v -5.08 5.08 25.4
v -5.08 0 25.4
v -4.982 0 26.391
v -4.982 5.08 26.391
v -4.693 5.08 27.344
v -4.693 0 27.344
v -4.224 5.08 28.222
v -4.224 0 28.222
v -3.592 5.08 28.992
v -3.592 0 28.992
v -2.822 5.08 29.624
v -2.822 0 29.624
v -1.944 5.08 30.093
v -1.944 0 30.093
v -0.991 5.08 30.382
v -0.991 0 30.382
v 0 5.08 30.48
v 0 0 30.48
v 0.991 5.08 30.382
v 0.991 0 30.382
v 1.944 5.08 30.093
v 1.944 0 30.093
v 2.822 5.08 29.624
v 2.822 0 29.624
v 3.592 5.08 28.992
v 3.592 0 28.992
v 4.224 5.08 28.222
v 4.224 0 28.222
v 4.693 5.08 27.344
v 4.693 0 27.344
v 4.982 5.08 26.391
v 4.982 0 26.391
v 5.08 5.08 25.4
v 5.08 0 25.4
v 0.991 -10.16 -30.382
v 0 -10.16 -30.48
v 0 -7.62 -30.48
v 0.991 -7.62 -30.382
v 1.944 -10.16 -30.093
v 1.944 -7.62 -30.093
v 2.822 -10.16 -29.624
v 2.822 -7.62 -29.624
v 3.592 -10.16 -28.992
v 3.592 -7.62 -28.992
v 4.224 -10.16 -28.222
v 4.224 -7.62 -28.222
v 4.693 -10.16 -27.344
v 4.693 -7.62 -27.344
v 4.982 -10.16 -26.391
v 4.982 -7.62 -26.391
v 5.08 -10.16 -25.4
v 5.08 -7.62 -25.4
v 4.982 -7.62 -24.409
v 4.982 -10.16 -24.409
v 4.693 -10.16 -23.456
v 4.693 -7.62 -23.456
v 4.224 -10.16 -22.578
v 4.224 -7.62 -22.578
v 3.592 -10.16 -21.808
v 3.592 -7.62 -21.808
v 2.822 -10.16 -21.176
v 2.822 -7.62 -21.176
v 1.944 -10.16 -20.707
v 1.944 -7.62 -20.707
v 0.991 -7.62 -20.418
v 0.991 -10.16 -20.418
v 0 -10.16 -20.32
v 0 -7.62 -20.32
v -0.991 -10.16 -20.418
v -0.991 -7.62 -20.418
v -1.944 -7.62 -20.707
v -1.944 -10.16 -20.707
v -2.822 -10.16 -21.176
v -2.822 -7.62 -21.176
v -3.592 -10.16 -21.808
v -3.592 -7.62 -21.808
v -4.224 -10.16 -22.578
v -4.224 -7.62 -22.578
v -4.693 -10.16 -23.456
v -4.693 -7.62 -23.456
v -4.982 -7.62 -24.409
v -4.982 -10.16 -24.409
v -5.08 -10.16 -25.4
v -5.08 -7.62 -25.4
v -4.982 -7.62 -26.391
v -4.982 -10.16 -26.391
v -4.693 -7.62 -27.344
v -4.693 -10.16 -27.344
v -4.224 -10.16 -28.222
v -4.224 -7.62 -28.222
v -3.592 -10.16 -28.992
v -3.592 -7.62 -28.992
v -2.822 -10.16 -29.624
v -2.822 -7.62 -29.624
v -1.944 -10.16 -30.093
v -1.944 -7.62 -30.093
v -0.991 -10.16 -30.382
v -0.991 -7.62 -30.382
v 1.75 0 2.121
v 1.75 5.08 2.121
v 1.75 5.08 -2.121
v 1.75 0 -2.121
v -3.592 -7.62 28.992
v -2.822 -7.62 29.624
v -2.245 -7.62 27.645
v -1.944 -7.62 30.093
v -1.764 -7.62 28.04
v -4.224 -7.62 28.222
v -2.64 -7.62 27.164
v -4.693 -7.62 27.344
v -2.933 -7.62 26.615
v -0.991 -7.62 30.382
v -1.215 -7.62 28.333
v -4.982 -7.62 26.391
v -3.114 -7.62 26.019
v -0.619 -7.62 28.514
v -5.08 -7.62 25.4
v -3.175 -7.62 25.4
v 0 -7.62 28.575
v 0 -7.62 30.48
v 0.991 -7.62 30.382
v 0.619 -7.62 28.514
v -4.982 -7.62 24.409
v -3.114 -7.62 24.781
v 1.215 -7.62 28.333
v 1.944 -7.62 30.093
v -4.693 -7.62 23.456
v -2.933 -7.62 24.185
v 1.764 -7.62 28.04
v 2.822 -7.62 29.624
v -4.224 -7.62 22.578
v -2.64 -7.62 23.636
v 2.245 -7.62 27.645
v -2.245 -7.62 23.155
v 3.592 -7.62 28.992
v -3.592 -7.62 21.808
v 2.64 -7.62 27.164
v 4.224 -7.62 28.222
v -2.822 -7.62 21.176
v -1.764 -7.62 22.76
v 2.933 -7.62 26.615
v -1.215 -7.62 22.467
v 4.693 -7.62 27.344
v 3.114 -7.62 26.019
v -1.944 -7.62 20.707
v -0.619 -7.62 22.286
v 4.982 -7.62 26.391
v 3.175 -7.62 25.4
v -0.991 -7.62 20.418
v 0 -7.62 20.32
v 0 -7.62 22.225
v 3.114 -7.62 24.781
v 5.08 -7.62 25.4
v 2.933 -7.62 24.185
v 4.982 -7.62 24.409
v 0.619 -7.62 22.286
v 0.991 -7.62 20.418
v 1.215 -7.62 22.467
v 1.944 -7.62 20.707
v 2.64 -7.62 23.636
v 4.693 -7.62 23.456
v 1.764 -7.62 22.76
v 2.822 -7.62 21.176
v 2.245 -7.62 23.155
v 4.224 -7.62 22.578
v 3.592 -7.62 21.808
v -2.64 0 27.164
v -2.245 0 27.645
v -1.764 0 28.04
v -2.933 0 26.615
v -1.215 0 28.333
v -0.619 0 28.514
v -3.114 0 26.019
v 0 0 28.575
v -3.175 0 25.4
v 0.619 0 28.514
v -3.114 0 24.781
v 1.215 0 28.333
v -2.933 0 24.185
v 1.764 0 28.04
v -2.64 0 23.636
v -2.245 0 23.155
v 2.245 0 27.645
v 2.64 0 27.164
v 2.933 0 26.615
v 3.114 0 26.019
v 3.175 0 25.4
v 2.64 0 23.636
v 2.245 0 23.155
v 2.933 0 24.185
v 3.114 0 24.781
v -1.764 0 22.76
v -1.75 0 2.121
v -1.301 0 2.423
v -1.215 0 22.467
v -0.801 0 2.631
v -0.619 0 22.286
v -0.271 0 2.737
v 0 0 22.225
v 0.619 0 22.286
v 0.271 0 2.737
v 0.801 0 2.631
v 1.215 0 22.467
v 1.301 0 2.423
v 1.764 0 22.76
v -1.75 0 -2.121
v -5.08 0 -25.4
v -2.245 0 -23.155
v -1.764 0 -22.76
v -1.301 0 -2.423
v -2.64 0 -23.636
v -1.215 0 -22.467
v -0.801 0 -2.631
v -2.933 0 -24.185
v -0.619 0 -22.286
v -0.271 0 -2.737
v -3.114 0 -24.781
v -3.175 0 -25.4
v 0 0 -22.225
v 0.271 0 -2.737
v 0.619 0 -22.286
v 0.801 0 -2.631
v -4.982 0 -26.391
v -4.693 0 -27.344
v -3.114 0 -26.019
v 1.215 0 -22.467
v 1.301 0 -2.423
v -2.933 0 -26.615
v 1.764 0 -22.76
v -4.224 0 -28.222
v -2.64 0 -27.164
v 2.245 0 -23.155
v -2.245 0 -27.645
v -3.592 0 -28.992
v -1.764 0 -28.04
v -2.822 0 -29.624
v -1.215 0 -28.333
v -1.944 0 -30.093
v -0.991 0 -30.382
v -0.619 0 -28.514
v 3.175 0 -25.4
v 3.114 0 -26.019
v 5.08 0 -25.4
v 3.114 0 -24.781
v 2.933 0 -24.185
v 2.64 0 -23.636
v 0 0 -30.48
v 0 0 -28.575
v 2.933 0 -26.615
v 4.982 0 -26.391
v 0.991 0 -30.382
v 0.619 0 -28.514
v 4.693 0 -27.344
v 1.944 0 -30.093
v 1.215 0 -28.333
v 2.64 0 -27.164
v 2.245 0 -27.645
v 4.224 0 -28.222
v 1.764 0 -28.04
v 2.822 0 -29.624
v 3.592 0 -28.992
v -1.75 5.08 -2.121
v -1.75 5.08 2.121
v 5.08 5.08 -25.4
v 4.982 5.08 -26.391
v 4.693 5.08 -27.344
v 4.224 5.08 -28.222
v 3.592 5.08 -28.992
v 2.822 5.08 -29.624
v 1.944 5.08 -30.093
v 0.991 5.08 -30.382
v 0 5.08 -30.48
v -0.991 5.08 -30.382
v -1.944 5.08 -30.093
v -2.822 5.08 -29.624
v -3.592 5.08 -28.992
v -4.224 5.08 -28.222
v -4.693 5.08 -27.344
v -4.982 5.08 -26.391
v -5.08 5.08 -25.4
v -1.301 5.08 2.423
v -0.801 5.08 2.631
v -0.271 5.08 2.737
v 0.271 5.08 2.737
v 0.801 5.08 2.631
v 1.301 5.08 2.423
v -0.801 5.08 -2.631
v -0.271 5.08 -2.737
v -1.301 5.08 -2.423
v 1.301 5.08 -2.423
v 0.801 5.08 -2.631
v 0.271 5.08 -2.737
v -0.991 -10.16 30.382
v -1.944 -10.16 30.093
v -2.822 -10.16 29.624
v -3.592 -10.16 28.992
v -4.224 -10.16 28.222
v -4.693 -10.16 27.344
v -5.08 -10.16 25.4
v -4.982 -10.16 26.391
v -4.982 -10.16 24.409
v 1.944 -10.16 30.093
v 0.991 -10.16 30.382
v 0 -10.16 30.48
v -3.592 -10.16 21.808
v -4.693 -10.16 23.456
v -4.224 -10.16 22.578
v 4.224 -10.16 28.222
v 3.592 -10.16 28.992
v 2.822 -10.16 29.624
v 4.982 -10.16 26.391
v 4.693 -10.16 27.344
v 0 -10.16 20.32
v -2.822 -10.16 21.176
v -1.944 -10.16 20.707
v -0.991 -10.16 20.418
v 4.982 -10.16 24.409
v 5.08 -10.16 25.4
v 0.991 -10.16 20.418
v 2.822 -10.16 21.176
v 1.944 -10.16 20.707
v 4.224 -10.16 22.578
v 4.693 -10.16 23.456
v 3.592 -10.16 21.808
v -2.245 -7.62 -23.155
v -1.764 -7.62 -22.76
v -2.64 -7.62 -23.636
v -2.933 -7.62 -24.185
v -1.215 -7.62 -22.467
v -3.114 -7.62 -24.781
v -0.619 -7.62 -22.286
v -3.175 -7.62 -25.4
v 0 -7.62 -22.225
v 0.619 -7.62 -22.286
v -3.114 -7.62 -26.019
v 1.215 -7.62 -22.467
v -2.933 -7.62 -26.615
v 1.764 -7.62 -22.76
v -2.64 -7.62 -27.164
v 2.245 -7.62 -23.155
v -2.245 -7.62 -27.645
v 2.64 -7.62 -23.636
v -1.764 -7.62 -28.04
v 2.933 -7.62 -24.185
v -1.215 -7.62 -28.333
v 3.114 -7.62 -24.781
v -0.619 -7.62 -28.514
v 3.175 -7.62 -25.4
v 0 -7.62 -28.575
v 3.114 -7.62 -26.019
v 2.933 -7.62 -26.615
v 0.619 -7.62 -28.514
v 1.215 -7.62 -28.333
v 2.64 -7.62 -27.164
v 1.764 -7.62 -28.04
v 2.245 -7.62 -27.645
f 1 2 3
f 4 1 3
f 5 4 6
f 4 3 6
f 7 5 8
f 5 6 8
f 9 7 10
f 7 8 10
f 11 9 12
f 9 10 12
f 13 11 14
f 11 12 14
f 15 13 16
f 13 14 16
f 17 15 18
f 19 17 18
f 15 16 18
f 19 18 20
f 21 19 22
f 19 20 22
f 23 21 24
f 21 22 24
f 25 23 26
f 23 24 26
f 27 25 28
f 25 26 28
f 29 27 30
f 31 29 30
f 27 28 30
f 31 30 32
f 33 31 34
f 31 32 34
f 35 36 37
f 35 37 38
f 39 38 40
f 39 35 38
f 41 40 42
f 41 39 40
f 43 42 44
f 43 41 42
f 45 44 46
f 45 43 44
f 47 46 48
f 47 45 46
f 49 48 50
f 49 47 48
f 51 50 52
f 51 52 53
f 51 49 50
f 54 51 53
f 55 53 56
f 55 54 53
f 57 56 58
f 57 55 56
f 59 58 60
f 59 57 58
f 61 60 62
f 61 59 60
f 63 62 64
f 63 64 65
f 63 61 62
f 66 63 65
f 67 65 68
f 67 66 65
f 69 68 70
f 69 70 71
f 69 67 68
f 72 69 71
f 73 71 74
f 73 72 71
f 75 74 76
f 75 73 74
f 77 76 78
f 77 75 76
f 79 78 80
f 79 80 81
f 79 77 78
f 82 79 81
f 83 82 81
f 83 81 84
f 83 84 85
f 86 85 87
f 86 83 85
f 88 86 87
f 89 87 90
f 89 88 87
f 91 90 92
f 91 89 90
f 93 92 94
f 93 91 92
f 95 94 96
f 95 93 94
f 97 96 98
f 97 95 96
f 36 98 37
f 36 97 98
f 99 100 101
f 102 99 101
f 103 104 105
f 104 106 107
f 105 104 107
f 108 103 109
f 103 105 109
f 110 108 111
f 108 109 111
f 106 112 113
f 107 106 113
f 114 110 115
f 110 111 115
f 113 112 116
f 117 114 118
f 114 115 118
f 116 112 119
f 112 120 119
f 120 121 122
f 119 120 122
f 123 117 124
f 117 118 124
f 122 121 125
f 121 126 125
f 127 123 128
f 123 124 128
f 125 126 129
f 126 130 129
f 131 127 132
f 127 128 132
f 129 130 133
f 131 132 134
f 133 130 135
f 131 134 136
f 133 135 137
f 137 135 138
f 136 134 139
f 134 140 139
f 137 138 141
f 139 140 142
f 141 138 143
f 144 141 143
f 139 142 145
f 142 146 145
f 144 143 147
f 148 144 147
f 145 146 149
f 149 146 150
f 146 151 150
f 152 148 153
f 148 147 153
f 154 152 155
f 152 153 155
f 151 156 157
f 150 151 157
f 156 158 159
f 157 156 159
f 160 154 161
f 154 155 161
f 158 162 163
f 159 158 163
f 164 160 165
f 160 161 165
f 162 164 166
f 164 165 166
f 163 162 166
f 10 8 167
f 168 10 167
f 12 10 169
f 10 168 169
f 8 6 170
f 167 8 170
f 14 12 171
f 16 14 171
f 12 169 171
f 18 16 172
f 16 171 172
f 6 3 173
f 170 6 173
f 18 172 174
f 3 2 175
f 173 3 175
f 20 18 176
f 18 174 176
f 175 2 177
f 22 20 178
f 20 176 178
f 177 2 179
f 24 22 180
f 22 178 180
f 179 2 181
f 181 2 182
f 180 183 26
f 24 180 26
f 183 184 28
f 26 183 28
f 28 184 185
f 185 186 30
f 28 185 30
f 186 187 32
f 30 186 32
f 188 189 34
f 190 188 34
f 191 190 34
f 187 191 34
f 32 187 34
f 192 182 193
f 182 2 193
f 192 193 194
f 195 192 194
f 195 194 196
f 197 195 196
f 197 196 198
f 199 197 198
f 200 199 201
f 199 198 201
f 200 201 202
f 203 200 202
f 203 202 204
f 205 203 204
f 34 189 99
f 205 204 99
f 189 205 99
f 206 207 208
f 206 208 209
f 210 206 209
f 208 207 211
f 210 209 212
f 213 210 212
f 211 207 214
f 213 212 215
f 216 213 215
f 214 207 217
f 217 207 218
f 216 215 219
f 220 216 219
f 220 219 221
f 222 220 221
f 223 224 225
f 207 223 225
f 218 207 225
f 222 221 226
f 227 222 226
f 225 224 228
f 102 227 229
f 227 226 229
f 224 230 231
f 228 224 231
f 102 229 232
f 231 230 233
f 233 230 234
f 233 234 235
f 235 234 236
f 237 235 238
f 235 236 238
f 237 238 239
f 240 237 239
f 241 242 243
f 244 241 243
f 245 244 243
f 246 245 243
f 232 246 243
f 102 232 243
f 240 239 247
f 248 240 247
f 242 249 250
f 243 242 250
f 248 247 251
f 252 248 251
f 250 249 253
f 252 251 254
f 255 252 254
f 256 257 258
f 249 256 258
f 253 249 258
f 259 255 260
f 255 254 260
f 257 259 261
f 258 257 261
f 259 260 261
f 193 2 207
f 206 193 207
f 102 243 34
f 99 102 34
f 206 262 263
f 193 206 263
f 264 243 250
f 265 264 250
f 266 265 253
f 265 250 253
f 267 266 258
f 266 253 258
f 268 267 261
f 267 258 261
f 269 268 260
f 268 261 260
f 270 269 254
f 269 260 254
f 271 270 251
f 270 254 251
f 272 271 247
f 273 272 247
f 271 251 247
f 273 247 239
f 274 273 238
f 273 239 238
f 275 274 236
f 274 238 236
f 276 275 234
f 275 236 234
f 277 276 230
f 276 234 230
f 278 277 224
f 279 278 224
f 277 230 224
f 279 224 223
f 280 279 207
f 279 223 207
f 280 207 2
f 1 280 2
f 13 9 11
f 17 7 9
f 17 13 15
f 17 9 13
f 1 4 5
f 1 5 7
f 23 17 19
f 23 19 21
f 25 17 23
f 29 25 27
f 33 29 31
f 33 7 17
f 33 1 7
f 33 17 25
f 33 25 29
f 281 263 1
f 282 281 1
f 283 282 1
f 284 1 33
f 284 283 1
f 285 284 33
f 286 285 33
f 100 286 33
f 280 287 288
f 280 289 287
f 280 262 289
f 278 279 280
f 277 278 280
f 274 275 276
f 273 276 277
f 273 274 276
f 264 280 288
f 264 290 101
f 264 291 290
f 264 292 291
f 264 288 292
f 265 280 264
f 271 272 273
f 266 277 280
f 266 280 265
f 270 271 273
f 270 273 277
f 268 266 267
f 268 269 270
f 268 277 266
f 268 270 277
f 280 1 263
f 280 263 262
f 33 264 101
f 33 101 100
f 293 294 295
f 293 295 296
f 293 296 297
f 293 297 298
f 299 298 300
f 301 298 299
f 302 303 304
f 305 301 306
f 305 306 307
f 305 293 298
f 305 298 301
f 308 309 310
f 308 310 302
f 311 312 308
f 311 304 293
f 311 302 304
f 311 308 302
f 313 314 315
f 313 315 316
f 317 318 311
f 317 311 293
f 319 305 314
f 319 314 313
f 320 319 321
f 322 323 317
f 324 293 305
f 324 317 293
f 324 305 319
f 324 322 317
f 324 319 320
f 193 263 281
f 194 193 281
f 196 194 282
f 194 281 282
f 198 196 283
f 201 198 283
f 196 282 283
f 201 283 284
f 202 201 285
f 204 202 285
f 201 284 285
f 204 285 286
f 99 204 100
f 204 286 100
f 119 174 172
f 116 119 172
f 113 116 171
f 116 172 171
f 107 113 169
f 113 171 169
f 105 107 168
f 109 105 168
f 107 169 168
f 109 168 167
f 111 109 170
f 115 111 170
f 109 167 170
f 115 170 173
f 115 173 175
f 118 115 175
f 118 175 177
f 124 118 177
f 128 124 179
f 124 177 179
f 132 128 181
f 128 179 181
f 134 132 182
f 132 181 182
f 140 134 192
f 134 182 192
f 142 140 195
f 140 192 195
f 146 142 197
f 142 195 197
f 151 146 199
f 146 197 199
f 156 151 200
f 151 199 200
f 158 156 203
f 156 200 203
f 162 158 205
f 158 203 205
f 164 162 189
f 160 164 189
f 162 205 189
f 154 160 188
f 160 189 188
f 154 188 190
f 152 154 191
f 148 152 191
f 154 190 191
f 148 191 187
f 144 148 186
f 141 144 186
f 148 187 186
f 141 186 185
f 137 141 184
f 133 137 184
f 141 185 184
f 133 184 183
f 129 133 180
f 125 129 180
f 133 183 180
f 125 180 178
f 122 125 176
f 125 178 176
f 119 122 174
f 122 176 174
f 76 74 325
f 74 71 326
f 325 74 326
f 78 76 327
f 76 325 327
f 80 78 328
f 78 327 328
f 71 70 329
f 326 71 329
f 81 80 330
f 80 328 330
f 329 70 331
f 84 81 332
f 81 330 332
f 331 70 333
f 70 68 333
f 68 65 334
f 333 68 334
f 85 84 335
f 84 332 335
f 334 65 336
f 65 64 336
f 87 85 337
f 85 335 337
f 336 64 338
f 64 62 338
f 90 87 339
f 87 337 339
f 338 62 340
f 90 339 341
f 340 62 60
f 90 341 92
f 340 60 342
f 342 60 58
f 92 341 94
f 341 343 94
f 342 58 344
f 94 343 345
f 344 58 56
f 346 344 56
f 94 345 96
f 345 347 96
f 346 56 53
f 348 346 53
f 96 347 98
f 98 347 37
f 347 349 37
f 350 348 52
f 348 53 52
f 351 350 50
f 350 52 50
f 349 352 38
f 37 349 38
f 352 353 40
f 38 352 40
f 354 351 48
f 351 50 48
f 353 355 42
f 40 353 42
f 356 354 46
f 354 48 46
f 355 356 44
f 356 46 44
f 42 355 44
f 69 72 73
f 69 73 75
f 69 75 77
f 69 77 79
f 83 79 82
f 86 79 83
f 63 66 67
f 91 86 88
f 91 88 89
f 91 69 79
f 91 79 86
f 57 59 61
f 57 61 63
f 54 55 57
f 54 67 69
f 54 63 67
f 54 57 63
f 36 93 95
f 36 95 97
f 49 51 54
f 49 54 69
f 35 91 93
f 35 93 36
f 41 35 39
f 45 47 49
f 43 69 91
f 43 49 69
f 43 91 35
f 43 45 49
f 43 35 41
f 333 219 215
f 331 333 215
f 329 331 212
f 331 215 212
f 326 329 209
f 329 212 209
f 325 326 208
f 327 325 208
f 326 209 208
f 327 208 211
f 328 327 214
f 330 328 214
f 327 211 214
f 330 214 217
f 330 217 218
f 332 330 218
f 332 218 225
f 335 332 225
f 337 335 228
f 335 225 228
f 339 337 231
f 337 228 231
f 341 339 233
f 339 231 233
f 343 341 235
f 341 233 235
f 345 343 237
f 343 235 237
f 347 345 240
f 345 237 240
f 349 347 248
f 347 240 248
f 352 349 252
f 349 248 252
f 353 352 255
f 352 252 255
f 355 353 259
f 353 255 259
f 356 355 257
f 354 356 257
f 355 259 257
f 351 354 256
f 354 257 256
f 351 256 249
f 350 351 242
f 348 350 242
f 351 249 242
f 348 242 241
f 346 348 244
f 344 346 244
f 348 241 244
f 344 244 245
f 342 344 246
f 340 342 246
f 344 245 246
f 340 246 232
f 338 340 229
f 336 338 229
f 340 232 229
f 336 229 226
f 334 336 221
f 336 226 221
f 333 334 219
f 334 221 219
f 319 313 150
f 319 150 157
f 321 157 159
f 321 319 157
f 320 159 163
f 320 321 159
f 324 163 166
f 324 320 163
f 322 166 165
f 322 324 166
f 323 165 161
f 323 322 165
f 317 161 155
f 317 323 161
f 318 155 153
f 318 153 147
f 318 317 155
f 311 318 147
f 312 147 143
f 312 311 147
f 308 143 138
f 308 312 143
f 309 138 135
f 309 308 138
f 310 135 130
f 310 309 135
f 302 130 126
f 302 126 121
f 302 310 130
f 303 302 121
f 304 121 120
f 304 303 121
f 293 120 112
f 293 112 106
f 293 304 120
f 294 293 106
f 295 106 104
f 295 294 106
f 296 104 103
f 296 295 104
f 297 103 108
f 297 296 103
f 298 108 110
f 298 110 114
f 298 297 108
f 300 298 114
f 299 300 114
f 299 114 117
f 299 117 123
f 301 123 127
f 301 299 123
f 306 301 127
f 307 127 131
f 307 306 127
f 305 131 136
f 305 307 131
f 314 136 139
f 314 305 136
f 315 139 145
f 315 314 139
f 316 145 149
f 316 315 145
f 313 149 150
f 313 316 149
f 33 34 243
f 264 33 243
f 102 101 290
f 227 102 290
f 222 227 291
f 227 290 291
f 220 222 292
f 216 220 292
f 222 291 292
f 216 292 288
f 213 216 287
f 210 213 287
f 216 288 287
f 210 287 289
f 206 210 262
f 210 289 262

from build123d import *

# Parameters (mm, degrees)
BOSS_EXTRUDE1_DEPTH = 5.08
SKETCH3_R           = 3.175
BOSS_EXTRUDE2_DEPTH = 7.62
BOSS_EXTRUDE3_START = 2.54
SKETCH6_R           = 5.08
BOSS_EXTRUDE3_DEPTH = 2.54
BOSS_EXTRUDE4_START = 2.54
SKETCH8_R           = 5.08
BOSS_EXTRUDE4_DEPTH = 2.54
CUT_EXTRUDE1_REACH  = 36.454


with BuildPart() as part:
    # Sketch2 → Boss-Extrude1 (new body)
    with BuildSketch(Plane(origin=(0, 0, 0), x_dir=(1, 0, 0), z_dir=(0, 1, 0))):
        with BuildLine():
            Line((-5.08, 25.4), (-5.08, -25.4))
            ThreePointArc((-5.08, -25.4), (0, -30.48), (5.08, -25.4))
            Line((5.08, -25.4), (5.08, 25.4))
            ThreePointArc((5.08, 25.4), (0, 30.48), (-5.08, 25.4))
        make_face()
    extrude(amount=BOSS_EXTRUDE1_DEPTH)

    # Sketch3 → Boss-Extrude2 (add)
    with BuildSketch(Plane(origin=(0, 0, 0), x_dir=(-1, 0, 0), z_dir=(0, -1, 0))):
        with Locations(Location((0, -25.4, 0), (0, 0, 270))):
            Circle(SKETCH3_R)
        with Locations(Location((0, 25.4, 0), (0, 0, 270))):
            Circle(SKETCH3_R)
    extrude(amount=BOSS_EXTRUDE2_DEPTH)

    # Sketch6 → Boss-Extrude3 (add)
    with BuildSketch(Plane.XZ.offset(7.62).offset(BOSS_EXTRUDE3_START)):
        with Locations(Location((0, 25.4, 0), (0, 0, 270))):
            Circle(SKETCH6_R)
    extrude(amount=-BOSS_EXTRUDE3_DEPTH)

    # Sketch8 → Boss-Extrude4 (add)
    with BuildSketch(Plane.XZ.offset(7.62).offset(BOSS_EXTRUDE4_START)):
        with Locations(Location((0, -25.4, 0), (0, 0, 270))):
            Circle(SKETCH8_R)
    extrude(amount=-BOSS_EXTRUDE4_DEPTH)

    # Sketch10 → Cut-Extrude1 (cut, up to next)
    with BuildSketch(Plane(origin=(0, 5.08, 0), x_dir=(1, 0, 0), z_dir=(0, 1, 0)), mode=Mode.PRIVATE) as cut_extrude1_sk1:
        with BuildLine():
            Line((-1.75, 2.121320344), (-1.75, -2.121320344))
            ThreePointArc((-1.75, -2.121320344), (0, -2.75), (1.75, -2.121320344))
            Line((1.75, -2.121320344), (1.75, 2.121320344))
            ThreePointArc((1.75, 2.121320344), (0, 2.75), (-1.75, 2.121320344))
        make_face()
    cut_extrude1_tool1 = extrude(cut_extrude1_sk1.sketch, amount=-CUT_EXTRUDE1_REACH, mode=Mode.PRIVATE) & part.part
    add(cut_extrude1_tool1.solids().sort_by_distance((0, 5.08, 0))[0], mode=Mode.SUBTRACT)


solid = part.part
